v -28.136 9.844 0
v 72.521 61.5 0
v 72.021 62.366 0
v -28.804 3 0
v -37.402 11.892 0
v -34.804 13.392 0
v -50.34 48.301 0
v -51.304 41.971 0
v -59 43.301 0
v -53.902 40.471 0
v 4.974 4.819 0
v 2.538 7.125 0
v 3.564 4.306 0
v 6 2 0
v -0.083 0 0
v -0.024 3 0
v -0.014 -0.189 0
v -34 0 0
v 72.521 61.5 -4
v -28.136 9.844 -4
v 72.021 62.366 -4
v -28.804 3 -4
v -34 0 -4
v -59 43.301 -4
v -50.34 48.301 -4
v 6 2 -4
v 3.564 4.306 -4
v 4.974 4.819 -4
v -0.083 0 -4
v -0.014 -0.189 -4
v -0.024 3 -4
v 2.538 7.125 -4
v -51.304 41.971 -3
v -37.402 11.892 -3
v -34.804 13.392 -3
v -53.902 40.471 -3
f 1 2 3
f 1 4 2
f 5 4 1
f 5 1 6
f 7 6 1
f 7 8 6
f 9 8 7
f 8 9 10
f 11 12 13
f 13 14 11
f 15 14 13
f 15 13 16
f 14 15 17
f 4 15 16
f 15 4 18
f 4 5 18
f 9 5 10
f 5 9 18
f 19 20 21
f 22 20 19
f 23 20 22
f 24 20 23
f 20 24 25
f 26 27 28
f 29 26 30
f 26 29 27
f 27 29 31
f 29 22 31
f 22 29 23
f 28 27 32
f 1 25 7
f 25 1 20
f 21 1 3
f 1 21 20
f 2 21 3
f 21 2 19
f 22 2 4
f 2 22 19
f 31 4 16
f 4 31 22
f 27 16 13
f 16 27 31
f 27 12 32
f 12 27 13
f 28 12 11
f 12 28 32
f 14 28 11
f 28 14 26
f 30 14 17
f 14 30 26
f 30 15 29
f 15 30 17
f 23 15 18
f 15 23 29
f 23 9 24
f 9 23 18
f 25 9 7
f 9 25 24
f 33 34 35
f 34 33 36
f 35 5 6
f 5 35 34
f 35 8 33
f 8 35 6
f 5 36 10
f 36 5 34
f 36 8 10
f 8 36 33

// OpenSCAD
// prints a left or right hand leg for
// mounting a popsocket holder on the dash of a
// toyota prius prime (2017)
// WARNING: print in ABS, since PLA will deform in the sun

// left-hand
gulch_offset = -1; // use 1 for right-hand, -1 for left-hand
flip = 180; // use flip 0 for right-hand, 180 for left-hand

// right-hand
//gulch_offset = 1; // use 1 for right-hand, -1 for left-hand
//flip = 0; // use flip 0 for right-hand, 180 for left-hand


depth = 4;
leg_width = 3;
clip_depth = 3;
bottom_hook_length = 6;
bottom_hook_angle = 20;
bottom_angle = 150;
bottom_length = 34;
mount_angle = bottom_angle-90;
top_length = 124;
top_base_thickness = 6;
top_tip_thickness = 1;
mount_length = 50;
mount_bulge = 10;
mount_gulch_length = 33;
mount_gulch_depth = 3;
mount_gulch_width = 3;
mount_gulch_from_front = 3;

rotate([0,flip,0]){
    difference(){
        linear_extrude(depth){
            // bottom hook
            translate([-bottom_hook_length,2]){
                rotate([0,0,-bottom_hook_angle]){
                    square([bottom_hook_length+.4, leg_width]);
                    translate([0,leg_width]){
                        polygon([[0,0],[1.5,0],[1.5,clip_depth]]);
                    }
                }
            }

            // bottom clip
            square([bottom_length, leg_width]);

            // top clip
            translate([bottom_length,0]){
                rotate([0,0,bottom_angle]){
                    polygon([[0,0],[top_length-1,0],[top_length-1,-top_tip_thickness],[0,-top_base_thickness]]);
                }
            }

            // mount leg
            translate([bottom_length,0]){
                rotate([0,0,mount_angle]){
                    square([mount_length, leg_width]);
                    translate([0,0]){
                        square([mount_length, mount_bulge]);
                    }
                }
            }
        }
        // mount gulch
        translate([bottom_length,0]){
            rotate([0,0,mount_angle]){

                translate([mount_length-mount_gulch_length-5,mount_gulch_from_front,gulch_offset]){
                    #cube([mount_gulch_length, mount_gulch_width, depth]);
                }
            }
        }
    }
}
